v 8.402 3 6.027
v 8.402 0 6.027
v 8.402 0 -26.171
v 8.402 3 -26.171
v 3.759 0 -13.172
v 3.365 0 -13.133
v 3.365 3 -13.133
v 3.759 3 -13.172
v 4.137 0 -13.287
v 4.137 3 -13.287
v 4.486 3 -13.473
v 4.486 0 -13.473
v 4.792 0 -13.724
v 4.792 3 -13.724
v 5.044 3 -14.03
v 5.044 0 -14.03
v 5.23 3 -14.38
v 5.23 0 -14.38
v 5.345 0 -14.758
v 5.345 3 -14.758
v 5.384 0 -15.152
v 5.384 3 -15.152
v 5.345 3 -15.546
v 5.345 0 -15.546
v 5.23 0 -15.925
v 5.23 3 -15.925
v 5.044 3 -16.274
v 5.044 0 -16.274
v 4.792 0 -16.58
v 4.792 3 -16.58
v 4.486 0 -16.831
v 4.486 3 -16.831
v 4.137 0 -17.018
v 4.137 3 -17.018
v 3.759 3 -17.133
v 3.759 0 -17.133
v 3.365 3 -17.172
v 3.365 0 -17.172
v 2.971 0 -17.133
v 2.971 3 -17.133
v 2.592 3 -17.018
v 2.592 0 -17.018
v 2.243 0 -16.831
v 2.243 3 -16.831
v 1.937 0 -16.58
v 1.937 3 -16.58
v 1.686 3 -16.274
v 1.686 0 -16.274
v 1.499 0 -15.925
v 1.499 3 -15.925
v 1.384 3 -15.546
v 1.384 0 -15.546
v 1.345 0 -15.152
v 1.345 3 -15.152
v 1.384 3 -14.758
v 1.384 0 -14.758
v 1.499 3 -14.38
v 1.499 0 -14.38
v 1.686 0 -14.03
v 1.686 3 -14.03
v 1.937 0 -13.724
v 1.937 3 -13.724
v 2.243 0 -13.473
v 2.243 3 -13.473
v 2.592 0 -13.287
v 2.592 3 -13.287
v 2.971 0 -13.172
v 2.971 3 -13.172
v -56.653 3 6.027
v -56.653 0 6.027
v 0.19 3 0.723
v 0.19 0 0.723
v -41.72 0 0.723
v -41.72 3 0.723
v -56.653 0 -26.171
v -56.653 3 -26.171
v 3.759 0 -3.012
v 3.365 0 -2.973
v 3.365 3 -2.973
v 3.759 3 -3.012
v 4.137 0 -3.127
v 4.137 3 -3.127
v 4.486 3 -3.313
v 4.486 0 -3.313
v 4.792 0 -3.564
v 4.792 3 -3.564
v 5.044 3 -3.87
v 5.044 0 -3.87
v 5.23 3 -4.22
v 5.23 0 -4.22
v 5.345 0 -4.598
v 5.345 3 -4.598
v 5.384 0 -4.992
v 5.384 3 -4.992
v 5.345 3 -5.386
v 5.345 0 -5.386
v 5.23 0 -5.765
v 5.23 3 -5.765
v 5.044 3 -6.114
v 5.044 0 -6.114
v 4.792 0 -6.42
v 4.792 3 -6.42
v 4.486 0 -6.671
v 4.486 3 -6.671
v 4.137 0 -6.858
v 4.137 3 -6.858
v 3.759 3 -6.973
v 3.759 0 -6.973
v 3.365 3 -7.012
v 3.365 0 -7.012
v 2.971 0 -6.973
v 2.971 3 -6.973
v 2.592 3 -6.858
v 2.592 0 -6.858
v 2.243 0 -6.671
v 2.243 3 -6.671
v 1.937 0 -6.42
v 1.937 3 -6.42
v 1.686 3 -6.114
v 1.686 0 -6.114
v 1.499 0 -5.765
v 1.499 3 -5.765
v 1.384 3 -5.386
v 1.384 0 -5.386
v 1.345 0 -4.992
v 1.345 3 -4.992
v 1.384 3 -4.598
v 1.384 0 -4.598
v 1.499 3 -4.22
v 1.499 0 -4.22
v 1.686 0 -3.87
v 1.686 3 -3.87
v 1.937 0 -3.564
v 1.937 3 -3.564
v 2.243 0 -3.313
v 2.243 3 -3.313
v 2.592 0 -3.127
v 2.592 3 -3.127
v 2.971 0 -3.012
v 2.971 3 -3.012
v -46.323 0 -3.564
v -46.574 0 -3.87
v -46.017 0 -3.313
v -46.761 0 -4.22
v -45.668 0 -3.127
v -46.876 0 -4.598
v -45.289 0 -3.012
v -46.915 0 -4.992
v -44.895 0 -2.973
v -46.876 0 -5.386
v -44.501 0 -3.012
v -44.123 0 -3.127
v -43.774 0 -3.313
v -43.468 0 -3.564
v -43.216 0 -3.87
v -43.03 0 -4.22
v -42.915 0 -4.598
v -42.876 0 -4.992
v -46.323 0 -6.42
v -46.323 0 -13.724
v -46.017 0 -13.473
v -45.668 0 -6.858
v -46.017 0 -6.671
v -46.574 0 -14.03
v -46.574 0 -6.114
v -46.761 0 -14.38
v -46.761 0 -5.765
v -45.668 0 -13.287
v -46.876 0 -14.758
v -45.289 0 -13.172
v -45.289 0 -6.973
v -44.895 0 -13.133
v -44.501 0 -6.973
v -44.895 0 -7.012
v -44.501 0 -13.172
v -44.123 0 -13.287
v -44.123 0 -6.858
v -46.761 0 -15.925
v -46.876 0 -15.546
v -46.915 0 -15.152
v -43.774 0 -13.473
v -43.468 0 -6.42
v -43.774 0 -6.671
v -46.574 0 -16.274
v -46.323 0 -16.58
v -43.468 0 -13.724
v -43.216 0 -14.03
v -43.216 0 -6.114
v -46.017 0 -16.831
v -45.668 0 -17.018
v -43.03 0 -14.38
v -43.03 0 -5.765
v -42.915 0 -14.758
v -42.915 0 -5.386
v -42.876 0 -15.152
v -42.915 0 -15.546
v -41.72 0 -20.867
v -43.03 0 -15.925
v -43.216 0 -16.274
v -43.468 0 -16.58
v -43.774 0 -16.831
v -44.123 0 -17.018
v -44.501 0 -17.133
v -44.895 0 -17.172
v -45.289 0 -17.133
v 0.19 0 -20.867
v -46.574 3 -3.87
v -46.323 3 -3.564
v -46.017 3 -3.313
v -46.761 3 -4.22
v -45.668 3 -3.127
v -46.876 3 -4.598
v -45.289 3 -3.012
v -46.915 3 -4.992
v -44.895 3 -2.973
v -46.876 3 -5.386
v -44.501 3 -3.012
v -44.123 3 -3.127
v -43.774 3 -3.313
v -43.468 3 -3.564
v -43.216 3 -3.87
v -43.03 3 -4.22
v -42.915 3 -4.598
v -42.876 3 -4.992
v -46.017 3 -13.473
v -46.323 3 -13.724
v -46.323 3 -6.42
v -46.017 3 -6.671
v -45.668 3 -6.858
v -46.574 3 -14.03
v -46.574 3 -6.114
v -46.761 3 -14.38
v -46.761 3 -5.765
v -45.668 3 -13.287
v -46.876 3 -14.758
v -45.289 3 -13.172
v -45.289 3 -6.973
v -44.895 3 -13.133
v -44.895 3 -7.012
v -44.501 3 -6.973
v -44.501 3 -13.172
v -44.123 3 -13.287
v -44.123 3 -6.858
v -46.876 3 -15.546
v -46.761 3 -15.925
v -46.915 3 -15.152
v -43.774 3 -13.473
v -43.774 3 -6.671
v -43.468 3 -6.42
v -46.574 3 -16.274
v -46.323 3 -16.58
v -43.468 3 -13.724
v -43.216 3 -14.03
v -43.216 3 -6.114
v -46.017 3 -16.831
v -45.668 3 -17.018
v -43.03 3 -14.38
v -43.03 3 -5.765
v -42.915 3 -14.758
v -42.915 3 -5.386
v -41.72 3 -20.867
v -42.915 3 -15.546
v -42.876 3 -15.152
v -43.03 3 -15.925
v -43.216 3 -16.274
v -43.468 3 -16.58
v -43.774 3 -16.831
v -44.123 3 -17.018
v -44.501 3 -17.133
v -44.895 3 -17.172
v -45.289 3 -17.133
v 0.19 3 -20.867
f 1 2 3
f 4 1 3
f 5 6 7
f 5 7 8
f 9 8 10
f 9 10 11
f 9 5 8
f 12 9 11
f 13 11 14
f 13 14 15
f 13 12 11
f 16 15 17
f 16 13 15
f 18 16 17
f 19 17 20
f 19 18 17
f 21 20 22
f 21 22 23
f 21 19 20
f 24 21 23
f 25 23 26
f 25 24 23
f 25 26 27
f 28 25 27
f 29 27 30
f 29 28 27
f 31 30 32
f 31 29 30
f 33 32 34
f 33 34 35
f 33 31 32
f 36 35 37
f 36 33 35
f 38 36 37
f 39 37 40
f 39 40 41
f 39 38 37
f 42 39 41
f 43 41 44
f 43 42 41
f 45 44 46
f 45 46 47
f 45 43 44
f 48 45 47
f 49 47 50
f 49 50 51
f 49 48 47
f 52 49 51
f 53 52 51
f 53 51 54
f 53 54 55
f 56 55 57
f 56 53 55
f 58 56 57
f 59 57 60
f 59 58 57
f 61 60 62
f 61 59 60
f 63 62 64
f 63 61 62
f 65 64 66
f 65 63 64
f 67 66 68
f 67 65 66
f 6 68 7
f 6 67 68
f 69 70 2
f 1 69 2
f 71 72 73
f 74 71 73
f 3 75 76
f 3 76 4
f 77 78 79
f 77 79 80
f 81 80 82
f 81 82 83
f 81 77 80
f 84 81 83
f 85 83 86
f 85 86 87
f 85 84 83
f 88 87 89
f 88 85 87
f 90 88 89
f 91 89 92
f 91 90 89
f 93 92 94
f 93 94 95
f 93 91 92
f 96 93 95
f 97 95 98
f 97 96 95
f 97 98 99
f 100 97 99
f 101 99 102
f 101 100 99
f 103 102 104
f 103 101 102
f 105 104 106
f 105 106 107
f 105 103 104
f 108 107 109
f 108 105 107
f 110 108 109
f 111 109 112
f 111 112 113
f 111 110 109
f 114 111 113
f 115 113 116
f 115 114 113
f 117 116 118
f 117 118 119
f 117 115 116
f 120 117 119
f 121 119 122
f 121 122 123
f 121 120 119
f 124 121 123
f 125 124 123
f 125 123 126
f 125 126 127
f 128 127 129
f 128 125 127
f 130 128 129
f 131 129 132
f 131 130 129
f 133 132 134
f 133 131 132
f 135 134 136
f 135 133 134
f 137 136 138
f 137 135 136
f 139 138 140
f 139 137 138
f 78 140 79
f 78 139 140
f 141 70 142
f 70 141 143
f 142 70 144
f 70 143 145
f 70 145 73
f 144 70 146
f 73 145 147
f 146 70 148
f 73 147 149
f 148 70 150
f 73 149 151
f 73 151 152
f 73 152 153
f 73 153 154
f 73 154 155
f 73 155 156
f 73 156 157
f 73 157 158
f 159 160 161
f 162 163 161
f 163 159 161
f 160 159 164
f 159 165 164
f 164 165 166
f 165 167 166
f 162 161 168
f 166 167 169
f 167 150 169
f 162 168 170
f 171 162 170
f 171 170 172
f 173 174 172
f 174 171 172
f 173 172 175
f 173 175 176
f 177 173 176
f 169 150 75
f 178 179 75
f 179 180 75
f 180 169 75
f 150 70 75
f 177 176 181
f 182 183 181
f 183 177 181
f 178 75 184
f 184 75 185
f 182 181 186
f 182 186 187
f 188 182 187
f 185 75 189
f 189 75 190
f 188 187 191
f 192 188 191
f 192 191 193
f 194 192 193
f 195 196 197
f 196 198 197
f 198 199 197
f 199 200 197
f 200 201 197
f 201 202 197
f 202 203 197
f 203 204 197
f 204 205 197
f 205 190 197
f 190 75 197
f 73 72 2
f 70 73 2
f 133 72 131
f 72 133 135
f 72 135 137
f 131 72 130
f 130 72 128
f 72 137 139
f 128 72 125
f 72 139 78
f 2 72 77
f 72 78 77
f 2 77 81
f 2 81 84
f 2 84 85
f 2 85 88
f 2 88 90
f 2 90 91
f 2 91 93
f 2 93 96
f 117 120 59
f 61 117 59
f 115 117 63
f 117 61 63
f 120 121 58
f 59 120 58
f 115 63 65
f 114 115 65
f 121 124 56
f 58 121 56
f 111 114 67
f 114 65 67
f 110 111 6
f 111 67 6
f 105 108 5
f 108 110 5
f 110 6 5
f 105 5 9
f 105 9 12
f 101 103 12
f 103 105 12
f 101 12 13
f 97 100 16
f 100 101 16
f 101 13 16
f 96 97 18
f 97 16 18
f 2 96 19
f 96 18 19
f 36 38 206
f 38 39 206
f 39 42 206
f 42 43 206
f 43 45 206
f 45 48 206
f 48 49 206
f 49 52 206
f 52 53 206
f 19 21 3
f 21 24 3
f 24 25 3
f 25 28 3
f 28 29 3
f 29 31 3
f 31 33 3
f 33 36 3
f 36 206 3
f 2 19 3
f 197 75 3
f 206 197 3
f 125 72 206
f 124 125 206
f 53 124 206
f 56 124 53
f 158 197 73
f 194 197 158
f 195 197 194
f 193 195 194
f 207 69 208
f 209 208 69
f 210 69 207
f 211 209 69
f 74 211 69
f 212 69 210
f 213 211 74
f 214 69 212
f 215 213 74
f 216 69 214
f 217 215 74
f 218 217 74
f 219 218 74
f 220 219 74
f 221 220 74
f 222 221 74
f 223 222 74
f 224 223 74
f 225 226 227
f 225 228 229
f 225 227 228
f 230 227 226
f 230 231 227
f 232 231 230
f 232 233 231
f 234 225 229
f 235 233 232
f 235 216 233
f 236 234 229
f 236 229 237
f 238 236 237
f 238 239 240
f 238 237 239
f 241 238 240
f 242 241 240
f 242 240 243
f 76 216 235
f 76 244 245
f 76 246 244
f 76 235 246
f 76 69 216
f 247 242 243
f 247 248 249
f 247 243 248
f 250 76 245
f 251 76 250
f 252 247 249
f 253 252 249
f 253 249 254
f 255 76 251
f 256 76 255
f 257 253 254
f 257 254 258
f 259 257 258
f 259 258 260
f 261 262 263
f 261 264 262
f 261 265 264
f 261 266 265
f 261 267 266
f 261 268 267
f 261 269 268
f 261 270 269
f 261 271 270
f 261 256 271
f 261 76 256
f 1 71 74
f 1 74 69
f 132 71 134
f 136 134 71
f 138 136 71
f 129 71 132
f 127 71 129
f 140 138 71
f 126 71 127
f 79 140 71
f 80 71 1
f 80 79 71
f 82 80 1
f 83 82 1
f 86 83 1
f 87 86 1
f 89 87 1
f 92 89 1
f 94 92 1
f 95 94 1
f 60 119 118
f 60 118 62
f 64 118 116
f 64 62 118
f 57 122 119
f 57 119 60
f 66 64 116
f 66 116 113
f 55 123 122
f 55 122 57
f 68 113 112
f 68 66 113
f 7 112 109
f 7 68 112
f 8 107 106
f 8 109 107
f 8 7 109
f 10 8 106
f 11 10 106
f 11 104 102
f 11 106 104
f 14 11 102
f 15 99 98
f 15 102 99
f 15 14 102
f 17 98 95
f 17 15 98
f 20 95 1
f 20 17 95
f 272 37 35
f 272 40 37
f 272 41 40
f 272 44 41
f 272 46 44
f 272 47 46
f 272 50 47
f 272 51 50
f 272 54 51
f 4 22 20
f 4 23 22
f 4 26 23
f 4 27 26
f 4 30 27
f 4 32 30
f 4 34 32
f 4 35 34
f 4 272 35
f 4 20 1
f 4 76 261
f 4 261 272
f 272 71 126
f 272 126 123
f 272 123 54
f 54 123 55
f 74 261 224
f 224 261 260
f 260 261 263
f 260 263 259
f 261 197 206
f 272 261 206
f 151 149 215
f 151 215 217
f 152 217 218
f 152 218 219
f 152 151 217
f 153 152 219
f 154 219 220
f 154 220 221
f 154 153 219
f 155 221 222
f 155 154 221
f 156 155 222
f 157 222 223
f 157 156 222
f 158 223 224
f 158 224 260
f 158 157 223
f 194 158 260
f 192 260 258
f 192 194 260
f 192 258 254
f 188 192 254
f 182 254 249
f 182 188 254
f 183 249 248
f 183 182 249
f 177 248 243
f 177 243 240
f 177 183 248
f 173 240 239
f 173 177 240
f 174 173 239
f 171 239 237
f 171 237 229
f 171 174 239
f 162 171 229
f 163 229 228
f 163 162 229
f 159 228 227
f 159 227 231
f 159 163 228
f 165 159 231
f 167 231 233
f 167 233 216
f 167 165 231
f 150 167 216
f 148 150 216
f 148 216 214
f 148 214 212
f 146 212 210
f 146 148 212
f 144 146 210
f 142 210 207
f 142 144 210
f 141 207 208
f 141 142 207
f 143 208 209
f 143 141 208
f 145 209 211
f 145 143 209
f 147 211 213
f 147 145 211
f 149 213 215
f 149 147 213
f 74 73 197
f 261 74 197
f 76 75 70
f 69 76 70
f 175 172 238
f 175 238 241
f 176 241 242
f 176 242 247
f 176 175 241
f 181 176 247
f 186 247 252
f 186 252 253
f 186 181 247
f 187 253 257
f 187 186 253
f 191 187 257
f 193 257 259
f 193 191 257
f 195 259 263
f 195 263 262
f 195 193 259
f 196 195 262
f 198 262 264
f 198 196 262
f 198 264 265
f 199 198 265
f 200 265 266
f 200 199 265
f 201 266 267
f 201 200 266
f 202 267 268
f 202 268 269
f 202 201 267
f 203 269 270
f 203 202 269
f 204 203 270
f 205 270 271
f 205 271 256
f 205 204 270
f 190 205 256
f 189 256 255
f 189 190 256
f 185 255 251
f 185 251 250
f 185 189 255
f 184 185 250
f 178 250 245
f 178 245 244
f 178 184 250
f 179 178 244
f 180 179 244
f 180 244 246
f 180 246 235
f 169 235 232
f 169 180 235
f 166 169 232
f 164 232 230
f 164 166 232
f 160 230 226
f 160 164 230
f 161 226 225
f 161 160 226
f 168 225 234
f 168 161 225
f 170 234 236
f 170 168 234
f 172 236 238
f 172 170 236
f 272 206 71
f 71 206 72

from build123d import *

# Parameters (mm, degrees)
SKETCH1_R           = 2.0193
SKETCH1_W           = 41.91
SKETCH1_H           = 5.304051748
BOSS_EXTRUDE1_DEPTH = 3


with BuildPart() as part:
    # Sketch1 → Boss-Extrude1 (new body)
    # profile 1 of 2: a face of its own
    with BuildSketch(Plane(origin=(0, 0, 0), x_dir=(1, 0, 0), z_dir=(0, 1, 0))):
        Polygon((0.189585243, 26.171402615), (0.189585243, 20.867350867), (0.189585243, -0.722649133), (-41.720414757, -0.722649133), (-41.720414757, 8.08226518), (-41.720414757, 12.010049159), (-41.720414757, 20.867350867), (-41.720414757, 26.171402615), (-56.653469857, 26.171402615), (-56.653469857, -6.026700881), (8.402064139, -6.026700881), (8.402064139, 26.171402615), align=None)
        with Locations(Location((-44.895414757, 4.992350867, 0), (0, 0, 270))):
            Circle(SKETCH1_R, mode=Mode.SUBTRACT)
        with Locations(Location((3.364585243, 4.992350867, 0), (0, 0, 270))):
            Circle(SKETCH1_R, mode=Mode.SUBTRACT)
        with Locations(Location((-44.895414757, 15.152350867, 0), (0, 0, 270))):
            Circle(SKETCH1_R, mode=Mode.SUBTRACT)
        with Locations(Location((3.364585243, 15.152350867, 0), (0, 0, 270))):
            Circle(SKETCH1_R, mode=Mode.SUBTRACT)
    # profile 2 of 2: a face of its own
    with BuildSketch(Plane(origin=(0, 0, 0), x_dir=(1, 0, 0), z_dir=(0, 1, 0))):
        with Locations((-20.765414757, 23.519376741)):
            Rectangle(SKETCH1_W, SKETCH1_H)
    extrude(amount=BOSS_EXTRUDE1_DEPTH)


solid = part.part
